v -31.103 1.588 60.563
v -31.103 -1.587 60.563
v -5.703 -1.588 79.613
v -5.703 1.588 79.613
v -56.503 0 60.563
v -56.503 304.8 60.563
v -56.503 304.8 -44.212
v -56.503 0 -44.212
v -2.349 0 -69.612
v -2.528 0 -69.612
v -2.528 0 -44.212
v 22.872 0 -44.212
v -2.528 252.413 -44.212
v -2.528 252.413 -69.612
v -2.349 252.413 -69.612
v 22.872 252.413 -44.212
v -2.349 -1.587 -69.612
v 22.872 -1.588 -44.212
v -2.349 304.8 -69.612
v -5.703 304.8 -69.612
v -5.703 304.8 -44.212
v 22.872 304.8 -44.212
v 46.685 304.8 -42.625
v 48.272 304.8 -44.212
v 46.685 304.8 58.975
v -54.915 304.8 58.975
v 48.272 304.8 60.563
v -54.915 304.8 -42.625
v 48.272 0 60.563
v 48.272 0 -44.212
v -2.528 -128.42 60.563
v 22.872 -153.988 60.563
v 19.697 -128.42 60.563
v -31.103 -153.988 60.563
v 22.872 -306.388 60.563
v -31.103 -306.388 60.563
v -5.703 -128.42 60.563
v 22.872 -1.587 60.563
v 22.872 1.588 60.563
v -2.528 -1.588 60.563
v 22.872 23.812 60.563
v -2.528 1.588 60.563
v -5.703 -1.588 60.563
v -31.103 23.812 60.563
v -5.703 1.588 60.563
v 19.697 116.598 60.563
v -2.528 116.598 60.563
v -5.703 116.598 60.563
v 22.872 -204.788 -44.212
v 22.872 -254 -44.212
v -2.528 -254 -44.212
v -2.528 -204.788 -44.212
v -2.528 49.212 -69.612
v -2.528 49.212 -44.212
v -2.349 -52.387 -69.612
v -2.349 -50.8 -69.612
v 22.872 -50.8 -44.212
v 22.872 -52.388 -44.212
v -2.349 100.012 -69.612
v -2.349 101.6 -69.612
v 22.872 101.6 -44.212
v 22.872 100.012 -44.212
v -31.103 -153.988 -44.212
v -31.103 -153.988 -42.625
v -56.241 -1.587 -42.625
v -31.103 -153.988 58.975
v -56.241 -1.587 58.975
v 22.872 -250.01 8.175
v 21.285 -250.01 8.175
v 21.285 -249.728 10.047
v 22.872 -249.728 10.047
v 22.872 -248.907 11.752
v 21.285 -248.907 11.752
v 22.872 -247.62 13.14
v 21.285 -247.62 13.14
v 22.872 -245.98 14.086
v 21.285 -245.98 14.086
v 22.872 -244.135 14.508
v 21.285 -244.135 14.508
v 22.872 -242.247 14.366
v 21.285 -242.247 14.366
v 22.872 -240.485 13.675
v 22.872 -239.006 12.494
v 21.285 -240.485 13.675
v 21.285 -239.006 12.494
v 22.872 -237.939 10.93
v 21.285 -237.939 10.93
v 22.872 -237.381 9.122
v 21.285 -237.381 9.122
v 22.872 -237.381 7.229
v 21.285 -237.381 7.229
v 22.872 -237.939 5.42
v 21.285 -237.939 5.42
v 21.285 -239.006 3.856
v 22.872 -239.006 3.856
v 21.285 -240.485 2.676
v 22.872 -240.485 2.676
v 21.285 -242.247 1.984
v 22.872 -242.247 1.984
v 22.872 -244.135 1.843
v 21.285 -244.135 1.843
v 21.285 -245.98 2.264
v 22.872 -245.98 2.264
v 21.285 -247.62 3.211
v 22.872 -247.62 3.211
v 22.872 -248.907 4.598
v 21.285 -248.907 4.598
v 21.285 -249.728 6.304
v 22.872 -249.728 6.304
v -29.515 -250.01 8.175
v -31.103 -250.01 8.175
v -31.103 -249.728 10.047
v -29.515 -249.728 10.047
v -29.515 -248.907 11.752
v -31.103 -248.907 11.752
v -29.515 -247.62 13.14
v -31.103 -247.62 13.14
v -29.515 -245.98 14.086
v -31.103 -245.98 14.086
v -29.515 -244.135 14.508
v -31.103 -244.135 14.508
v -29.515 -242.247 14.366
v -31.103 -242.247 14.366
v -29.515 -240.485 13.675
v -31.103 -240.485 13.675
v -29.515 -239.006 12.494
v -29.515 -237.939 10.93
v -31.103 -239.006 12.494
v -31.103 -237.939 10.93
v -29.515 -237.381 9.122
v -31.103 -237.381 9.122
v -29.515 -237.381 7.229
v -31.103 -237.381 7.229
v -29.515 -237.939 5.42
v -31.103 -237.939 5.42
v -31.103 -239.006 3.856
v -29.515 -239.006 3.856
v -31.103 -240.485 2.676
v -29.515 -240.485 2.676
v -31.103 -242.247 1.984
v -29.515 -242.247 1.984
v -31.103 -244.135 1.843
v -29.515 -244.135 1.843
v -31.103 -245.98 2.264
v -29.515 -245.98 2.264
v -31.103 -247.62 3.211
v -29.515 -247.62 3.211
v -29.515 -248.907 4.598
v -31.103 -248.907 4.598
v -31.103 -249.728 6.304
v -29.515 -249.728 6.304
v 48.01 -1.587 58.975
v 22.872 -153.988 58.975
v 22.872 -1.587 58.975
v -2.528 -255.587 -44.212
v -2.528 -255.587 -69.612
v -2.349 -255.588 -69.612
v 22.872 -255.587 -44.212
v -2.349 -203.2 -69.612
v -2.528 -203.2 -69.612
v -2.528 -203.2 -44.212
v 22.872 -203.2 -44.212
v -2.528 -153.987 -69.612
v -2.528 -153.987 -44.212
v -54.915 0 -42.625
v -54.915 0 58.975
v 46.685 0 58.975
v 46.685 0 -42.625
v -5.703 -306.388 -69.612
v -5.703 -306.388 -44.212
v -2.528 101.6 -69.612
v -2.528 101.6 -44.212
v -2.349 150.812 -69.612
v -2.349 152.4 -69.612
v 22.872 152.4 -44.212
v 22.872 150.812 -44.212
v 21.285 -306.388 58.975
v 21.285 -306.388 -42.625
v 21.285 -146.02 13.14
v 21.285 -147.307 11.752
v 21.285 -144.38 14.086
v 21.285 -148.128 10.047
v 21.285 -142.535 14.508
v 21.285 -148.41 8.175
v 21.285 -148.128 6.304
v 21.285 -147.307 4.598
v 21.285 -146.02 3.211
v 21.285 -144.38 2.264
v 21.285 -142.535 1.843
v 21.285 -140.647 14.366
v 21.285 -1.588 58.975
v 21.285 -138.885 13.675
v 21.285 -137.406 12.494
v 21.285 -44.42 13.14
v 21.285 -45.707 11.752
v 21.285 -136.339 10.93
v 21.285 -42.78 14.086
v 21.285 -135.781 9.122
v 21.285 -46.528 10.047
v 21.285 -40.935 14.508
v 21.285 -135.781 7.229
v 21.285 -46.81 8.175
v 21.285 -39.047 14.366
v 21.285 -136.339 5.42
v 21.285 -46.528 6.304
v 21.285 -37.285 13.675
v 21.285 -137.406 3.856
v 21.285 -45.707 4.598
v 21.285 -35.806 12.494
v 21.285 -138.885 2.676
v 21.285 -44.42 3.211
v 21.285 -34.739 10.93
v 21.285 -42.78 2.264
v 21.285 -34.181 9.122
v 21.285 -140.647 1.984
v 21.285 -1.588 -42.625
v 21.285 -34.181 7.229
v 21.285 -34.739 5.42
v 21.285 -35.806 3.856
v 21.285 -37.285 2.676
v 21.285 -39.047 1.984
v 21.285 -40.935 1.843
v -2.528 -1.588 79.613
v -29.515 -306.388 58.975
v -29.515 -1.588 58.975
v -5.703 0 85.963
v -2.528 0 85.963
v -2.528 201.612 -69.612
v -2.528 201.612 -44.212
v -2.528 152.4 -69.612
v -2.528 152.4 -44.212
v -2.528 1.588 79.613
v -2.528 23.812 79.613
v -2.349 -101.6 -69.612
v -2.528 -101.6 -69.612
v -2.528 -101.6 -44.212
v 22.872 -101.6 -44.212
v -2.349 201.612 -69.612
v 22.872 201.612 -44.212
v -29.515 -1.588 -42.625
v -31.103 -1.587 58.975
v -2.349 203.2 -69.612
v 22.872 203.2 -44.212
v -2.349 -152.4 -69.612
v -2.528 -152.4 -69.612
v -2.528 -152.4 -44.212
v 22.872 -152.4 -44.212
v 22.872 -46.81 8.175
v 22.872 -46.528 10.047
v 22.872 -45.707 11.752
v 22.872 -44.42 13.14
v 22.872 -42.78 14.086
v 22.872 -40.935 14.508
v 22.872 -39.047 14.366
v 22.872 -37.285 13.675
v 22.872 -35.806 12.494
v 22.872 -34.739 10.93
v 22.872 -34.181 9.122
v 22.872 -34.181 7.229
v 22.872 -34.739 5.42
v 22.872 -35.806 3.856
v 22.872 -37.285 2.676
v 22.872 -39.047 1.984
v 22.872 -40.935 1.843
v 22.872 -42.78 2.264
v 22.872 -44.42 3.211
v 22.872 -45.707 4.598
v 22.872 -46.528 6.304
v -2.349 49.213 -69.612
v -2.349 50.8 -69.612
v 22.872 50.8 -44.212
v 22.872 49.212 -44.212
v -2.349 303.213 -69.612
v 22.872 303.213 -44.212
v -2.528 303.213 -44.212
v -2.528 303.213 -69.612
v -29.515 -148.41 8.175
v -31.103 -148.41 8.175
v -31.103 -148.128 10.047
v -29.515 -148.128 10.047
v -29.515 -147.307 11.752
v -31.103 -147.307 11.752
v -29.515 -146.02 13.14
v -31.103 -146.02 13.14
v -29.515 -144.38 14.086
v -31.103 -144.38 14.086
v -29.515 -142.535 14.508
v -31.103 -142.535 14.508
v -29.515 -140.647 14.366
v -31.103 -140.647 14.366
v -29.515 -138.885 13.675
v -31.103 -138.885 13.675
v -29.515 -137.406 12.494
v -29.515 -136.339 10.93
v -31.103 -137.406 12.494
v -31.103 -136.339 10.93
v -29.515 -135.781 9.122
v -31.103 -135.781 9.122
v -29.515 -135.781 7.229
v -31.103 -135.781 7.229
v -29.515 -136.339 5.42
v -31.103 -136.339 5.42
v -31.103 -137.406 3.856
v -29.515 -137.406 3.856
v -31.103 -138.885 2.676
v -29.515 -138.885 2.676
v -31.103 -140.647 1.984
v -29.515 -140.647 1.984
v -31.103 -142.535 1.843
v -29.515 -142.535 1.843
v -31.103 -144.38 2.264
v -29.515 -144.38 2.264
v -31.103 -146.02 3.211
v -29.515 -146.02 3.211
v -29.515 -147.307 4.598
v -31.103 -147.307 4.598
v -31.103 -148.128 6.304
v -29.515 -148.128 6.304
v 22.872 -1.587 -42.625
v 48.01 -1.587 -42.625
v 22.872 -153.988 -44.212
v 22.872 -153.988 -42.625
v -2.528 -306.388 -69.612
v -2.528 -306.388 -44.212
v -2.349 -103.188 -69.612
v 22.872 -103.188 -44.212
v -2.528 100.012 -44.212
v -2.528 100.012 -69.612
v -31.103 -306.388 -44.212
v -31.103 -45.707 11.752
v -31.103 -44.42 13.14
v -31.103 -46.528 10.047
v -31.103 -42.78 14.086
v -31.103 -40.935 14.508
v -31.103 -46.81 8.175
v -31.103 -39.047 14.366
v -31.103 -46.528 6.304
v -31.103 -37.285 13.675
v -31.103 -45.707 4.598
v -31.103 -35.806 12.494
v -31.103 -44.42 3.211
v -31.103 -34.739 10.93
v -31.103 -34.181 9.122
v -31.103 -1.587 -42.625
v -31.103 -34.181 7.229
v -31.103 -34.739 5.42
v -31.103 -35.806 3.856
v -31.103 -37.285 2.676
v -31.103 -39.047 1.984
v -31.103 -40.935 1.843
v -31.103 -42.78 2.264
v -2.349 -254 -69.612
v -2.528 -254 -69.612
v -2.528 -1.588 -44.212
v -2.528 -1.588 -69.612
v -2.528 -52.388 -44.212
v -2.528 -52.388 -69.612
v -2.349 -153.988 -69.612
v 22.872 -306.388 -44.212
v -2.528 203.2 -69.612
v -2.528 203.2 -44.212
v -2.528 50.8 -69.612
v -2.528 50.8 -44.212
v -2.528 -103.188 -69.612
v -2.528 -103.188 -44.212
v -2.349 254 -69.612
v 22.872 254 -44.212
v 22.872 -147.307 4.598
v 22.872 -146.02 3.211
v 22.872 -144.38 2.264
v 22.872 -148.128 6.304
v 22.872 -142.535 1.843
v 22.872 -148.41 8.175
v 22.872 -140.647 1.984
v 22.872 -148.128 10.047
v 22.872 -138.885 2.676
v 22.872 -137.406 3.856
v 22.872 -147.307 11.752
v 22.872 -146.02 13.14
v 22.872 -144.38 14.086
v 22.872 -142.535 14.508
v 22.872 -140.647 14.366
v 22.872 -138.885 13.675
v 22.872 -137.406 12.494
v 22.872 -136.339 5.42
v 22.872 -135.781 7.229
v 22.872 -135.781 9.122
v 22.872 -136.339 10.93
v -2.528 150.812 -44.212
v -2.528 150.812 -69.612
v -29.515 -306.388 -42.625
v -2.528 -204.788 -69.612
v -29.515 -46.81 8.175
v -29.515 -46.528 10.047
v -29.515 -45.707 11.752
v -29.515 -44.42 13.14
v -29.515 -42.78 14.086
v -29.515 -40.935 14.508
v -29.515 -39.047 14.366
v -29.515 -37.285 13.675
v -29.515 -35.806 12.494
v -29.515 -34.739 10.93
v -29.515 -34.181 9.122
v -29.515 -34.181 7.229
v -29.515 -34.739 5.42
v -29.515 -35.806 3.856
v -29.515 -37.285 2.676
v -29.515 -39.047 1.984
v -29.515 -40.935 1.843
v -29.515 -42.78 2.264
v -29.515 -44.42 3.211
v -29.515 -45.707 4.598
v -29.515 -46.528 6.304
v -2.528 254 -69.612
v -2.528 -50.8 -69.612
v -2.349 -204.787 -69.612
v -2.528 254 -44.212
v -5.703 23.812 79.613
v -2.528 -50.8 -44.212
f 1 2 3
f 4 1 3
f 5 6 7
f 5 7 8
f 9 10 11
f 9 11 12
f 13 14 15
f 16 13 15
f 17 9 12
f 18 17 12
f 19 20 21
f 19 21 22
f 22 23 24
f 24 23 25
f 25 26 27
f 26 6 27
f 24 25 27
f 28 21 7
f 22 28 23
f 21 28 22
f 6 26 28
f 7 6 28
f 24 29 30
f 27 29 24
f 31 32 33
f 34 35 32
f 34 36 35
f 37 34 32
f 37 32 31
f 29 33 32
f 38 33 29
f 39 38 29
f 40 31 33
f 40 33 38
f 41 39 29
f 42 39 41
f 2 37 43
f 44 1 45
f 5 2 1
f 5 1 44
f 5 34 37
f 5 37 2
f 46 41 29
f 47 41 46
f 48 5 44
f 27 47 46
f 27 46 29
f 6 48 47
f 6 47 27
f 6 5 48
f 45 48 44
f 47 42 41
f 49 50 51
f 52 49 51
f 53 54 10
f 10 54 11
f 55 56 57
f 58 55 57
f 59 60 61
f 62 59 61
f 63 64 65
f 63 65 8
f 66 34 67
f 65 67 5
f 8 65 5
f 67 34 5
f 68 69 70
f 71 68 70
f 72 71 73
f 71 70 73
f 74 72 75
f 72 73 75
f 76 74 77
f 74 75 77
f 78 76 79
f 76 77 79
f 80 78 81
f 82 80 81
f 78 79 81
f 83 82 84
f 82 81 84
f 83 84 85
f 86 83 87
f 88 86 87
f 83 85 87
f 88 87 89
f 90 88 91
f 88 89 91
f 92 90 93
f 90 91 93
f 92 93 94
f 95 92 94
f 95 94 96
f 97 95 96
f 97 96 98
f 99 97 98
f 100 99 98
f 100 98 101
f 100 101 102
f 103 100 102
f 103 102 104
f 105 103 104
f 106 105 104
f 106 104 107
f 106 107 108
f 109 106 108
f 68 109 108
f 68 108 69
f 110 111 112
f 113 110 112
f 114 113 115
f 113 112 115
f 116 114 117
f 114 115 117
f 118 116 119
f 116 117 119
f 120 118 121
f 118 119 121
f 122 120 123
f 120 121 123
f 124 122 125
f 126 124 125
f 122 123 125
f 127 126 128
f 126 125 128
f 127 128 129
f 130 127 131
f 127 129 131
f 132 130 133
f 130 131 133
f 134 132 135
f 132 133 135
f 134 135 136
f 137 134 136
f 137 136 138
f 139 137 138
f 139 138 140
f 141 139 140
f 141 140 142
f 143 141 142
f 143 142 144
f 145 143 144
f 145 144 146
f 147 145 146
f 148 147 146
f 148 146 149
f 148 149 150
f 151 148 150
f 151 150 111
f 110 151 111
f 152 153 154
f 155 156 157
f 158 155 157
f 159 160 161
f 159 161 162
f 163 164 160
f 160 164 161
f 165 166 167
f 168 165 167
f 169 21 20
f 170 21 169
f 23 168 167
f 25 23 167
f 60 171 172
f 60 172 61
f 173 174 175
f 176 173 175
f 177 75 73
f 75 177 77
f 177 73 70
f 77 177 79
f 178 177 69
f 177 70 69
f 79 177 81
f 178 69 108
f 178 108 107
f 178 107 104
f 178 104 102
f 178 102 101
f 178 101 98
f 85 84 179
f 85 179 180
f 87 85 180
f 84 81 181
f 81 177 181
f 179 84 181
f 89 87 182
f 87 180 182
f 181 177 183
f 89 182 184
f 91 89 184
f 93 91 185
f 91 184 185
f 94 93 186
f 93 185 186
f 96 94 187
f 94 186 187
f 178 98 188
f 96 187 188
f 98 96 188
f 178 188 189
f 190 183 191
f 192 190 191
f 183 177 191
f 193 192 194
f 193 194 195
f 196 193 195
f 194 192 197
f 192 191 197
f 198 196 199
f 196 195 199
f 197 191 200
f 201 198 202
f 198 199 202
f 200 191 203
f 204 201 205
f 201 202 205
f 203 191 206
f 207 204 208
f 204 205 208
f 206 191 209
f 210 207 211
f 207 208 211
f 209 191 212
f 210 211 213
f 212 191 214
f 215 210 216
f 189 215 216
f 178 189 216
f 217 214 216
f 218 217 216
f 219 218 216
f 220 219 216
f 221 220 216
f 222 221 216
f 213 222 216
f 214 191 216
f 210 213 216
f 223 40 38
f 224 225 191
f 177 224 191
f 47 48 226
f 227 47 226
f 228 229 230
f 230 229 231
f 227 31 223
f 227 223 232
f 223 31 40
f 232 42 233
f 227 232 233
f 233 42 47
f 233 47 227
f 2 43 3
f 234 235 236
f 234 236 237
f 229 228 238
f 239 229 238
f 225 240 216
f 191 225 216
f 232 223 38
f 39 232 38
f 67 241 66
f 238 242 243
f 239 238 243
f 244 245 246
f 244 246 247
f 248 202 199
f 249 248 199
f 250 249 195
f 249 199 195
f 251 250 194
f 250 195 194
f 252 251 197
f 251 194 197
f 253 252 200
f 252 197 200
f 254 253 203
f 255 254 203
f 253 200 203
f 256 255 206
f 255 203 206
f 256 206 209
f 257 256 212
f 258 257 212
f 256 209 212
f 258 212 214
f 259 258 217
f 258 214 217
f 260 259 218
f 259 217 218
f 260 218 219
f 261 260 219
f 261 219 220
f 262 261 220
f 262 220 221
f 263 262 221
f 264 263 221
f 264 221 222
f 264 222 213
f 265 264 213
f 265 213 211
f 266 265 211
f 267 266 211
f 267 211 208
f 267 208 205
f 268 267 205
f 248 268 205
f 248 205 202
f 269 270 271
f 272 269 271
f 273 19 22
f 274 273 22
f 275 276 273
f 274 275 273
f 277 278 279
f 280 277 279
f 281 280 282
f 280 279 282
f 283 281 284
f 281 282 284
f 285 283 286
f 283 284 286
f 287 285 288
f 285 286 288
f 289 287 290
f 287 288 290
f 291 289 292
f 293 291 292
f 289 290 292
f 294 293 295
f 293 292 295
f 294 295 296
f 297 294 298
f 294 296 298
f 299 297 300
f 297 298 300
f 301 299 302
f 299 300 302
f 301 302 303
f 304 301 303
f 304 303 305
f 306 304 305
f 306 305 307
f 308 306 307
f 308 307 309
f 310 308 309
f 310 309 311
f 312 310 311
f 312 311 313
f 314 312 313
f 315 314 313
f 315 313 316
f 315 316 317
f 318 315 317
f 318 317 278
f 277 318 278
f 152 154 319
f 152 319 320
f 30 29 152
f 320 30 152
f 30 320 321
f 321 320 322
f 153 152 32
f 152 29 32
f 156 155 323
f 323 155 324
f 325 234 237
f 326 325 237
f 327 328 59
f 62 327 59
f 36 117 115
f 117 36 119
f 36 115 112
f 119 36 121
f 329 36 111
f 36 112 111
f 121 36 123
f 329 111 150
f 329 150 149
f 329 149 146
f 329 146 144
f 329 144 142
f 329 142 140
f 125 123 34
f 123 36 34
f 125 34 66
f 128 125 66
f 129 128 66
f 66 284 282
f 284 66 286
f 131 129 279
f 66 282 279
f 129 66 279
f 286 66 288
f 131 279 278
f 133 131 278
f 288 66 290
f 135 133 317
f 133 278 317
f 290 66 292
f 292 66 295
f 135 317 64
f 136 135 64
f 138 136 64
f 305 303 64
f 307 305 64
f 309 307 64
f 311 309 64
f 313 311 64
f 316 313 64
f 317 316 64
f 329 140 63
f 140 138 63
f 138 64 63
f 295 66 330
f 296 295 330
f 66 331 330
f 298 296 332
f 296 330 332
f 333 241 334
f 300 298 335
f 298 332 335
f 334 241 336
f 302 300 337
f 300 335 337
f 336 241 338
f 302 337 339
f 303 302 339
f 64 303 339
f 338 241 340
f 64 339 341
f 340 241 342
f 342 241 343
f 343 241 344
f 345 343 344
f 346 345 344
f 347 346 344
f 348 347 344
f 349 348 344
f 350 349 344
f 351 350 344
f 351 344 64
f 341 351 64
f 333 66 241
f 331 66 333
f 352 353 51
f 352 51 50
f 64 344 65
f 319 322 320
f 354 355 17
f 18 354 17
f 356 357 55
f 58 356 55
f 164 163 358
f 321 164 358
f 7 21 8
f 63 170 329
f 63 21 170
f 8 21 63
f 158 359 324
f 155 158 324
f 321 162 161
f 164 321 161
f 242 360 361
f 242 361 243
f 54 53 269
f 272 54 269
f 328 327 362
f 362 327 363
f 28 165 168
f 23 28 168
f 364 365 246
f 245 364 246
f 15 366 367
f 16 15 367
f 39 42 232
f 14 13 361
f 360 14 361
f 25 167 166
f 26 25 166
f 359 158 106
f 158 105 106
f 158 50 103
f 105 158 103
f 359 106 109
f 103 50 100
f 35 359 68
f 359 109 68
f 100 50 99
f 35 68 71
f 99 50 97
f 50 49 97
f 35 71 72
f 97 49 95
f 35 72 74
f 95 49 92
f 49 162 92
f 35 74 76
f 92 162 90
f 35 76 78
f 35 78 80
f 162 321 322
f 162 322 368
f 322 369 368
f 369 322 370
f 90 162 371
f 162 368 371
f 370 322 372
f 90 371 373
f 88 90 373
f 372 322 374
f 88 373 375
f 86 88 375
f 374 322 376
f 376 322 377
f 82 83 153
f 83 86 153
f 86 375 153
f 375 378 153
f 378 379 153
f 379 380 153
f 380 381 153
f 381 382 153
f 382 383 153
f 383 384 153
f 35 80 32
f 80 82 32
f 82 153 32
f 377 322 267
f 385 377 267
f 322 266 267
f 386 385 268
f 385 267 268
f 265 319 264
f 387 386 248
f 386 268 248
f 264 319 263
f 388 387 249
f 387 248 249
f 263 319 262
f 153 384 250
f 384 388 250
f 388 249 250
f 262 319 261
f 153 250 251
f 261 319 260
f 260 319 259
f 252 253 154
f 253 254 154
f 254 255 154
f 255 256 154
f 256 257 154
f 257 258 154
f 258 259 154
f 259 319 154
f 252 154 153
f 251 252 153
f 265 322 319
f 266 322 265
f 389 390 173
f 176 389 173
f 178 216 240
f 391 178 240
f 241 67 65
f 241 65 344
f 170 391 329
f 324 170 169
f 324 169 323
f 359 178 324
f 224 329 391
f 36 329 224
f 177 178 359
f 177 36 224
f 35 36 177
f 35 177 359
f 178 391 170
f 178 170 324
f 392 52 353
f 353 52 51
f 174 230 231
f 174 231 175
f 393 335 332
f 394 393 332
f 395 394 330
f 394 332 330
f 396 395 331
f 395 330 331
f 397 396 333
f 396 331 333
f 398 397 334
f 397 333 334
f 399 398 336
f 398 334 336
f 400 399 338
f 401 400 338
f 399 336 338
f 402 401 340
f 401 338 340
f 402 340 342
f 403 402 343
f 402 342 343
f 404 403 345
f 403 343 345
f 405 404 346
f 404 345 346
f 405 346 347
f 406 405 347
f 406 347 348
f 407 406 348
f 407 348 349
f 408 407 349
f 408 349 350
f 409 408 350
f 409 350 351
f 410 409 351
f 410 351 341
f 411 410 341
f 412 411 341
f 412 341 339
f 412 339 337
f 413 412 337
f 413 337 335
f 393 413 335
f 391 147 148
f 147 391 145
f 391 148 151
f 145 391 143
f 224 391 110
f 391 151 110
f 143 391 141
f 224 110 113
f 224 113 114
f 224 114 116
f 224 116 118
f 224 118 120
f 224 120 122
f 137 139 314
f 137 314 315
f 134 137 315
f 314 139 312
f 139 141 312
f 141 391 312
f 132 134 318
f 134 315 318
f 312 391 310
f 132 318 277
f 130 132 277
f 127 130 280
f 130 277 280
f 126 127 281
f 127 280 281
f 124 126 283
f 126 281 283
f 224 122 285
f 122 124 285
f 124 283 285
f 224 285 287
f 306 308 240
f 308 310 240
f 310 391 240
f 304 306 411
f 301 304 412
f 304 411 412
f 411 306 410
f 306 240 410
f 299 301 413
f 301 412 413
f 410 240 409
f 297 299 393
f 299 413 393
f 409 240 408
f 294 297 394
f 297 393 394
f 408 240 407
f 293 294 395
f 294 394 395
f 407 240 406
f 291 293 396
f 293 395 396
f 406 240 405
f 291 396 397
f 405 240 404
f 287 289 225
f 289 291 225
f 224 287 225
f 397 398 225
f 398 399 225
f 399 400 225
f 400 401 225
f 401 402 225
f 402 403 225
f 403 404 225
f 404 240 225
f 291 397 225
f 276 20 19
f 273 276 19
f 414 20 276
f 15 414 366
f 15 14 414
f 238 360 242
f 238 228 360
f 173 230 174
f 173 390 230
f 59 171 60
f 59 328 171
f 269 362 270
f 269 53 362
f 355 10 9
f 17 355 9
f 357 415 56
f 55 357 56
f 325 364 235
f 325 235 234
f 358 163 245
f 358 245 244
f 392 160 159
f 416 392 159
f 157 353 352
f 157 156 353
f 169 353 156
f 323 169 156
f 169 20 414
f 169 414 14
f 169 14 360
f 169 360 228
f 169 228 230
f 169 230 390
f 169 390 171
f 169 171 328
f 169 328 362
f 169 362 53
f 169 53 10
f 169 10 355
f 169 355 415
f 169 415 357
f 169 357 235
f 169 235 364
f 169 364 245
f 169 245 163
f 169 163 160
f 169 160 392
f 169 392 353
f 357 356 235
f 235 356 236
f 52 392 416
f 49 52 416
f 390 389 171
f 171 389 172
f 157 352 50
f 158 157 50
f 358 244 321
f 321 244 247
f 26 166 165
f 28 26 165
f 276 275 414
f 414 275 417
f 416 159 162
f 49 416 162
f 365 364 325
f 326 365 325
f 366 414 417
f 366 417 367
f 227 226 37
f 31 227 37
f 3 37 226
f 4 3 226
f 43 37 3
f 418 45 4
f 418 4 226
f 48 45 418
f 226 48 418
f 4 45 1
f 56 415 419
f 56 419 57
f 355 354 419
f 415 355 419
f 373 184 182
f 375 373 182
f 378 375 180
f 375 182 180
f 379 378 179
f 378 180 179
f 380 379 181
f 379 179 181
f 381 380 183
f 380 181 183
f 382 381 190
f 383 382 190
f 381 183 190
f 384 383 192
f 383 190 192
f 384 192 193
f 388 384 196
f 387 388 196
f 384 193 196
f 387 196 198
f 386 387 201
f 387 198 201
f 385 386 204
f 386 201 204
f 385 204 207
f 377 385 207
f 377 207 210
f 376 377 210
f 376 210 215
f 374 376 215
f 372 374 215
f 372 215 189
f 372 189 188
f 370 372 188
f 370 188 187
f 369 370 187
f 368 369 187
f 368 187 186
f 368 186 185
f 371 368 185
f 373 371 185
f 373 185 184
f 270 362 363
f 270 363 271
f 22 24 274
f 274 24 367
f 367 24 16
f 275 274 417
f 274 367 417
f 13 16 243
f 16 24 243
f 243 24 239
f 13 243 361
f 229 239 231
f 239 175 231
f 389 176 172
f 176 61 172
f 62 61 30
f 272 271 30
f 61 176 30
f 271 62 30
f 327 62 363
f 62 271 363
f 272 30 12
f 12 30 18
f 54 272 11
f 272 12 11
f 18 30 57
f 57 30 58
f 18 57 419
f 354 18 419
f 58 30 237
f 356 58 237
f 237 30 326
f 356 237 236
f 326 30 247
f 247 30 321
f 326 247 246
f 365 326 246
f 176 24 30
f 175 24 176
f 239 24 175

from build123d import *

# Parameters (mm, degrees)
F0_W           = 104.775
F0_H           = 104.775
F0_W_2         = 101.6
F0_H_2         = 101.6
F1_DEPTH       = 1.5875
F3_DEPTH       = 304.8
F5_DEPTH       = 304.8
F6_W           = 152.4
F6_H           = 1.5875
F7_DEPTH       = 25.4
F8_W           = 152.4
F8_H           = 1.5875
F9_DEPTH       = 25.4
F11_DEPTH      = 177.8
F12_W          = 3.175
F12_H          = 611.1875
F13_DEPTH      = 25.4
F14_R          = 6.35
F15_DEPTH      = 213.36
F16_W          = 25.4
F16_H          = 1.5875
F17_DEPTH      = 25.4
F19_DEPTH      = 1828.8
F20_W          = 1.5875
F20_H          = 245.0186535716
F21_DEPTH      = 25.4
F23_DEPTH      = 25.4
F24_W          = 1.5875
F24_H          = 19.05
F25_DEPTH      = 25.4
F25_DEPTH_BACK = 28.575
F27_DEPTH      = 25.4
F29_DEPTH      = 25.4


with BuildPart() as f1:
    # F0 (on Front) → F1 (new body)
    with BuildSketch(Plane.XZ):
        with Locations((-4.1154902428, 8.1752620383)):
            Rectangle(F0_W, F0_H)
        with Locations((-4.1154902428, 8.1752620383)):
            Rectangle(F0_W_2, F0_H_2, mode=Mode.SUBTRACT)
        with Locations((-4.1154902428, 8.1752620383)):
            Rectangle(F0_W_2, F0_H_2)
    extrude(amount=F1_DEPTH)

    # F2 (on face) → F3 (join)
    with BuildSketch(Plane(origin=(0, 0, 0), x_dir=(-1, 0, 0), z_dir=(0, 1, 0))):
        Polygon((-46.6845097572, 58.9752620383), (-48.2720097572, 60.5627620383), (-48.2720097572, -44.2122379617), (56.5029902428, -44.2122379617), (54.9154902428, -42.6247379617), (-46.6845097572, -42.6247379617), align=None)
        Polygon((56.5029902428, 60.5627620383), (-48.2720097572, 60.5627620383), (-46.6845097572, 58.9752620383), (54.9154902428, 58.9752620383), (54.9154902428, -42.6247379617), (56.5029902428, -44.2122379617), align=None)
    extrude(amount=F3_DEPTH)

    # F4 (on face) → F5 (join)
    with BuildSketch(Plane.XZ.offset(1.5875)):
        Polygon((-31.1029902428, 60.5627620383), (-31.1029902428, 35.1627620383), (-29.5154902428, 33.5752620383), (-29.5154902428, 58.9752620383), (21.2845097572, 58.9752620383), (21.2845097572, -17.2247379617), (22.8720097572, -18.8122379617), (22.8720097572, 60.5627620383), align=None)
        Polygon((-29.5154902428, 33.5752620383), (-31.1029902428, 35.1627620383), (-31.1029902428, -44.2122379617), (22.8720097572, -44.2122379617), (22.8720097572, -18.8122379617), (21.2845097572, -17.2247379617), (21.2845097572, -42.6247379617), (-29.5154902428, -42.6247379617), align=None)
    extrude(amount=F5_DEPTH)

    # F6 (on face) → F7 (join)
    with BuildSketch(Plane(origin=(-31.1029902428, 0, 0), x_dir=(0, -1, 0), z_dir=(-1, 0, 0))):
        with Locations((77.7875, 59.7690120383)):
            Rectangle(F6_W, F6_H)
        with Locations((77.7875, -43.4184879617)):
            Rectangle(F6_W, F6_H)
    extrude(amount=F7_DEPTH)

    # F8 (on face) → F9 (join)
    with BuildSketch(Plane.YZ.offset(22.8720097572)):
        with Locations((-77.7875, 59.7690120383)):
            Rectangle(F8_W, F8_H)
        with Locations((-77.7875, -43.4184879617)):
            Rectangle(F8_W, F8_H)
    extrude(amount=F9_DEPTH)

    # F10 (on face) → F11 (cut)
    with BuildSketch(Plane.XY.offset(60.5627620383)):
        Polygon((-31.1029902428, -153.9875), (-56.5029902428, 0), (-56.5029902428, -153.9875), align=None)
        Polygon((48.2720097572, -153.9875), (48.2720097572, 0), (22.8720097572, -153.9875), align=None)
    extrude(amount=-F11_DEPTH, mode=Mode.SUBTRACT)

    # F12 (on face) → F13 (join)
    with BuildSketch(Plane(origin=(0, 0, -44.2122379617), x_dir=(1, 0, 0), z_dir=(0, 0, -1))):
        with Locations((-4.1154902428, 0.79375)):
            Rectangle(F12_W, F12_H)
    extrude(amount=F13_DEPTH)

    # F14 (on face) → F15 (cut)
    with BuildSketch(Plane(origin=(-31.1029902428, 0, 0), x_dir=(0, -1, 0), z_dir=(-1, 0, 0))):
        with Locations((40.4604896903, 8.1752620383)):
            Circle(F14_R)
        with Locations((142.0604896903, 8.1752620383)):
            Circle(F14_R)
        with Locations((243.6604896903, 8.1752620383)):
            Circle(F14_R)
    extrude(amount=-F15_DEPTH, mode=Mode.SUBTRACT)

    # F16 (on face) → F17 (join)
    with BuildSketch(Plane(origin=(0, 0, -44.2122379617), x_dir=(1, 0, 0), z_dir=(0, 0, -1))):
        with Locations((10.1720097572, -304.00625)):
            Rectangle(F16_W, F16_H)
        with Locations((10.1720097572, -253.20625)):
            Rectangle(F16_W, F16_H)
        with Locations((10.1720097572, -202.40625)):
            Rectangle(F16_W, F16_H)
        with Locations((10.1720097572, -151.60625)):
            Rectangle(F16_W, F16_H)
        with Locations((10.1720097572, -100.80625)):
            Rectangle(F16_W, F16_H)
        with Locations((10.1720097572, -50.00625)):
            Rectangle(F16_W, F16_H)
        with Locations((10.1720097572, 0.79375)):
            Rectangle(F16_W, F16_H)
        with Locations((10.1720097572, 102.39375)):
            Rectangle(F16_W, F16_H)
        with Locations((10.1720097572, 51.59375)):
            Rectangle(F16_W, F16_H)
        with Locations((10.1720097572, 153.19375)):
            Rectangle(F16_W, F16_H)
        with Locations((10.1720097572, 203.99375)):
            Rectangle(F16_W, F16_H)
        with Locations((10.1720097572, 254.79375)):
            Rectangle(F16_W, F16_H)
    extrude(amount=F17_DEPTH)

    # F18 (on face) → F19 (cut)
    with BuildSketch(Plane(origin=(0, 304.8, 0), x_dir=(-1, 0, 0), z_dir=(0, 1, 0))):
        Polygon((-22.8720097572, -69.6122379617), (2.3494476918, -69.6122379617), (-22.8720097572, -44.2122379617), align=None)
    extrude(amount=-F19_DEPTH, mode=Mode.SUBTRACT)

    # F20 (on face) → F21 (join)
    with BuildSketch(Plane.XY.offset(60.5627620383)):
        with Locations((-4.9092402428, -5.9108771384)):
            Rectangle(F20_W, F20_H)
        with Locations((-3.3217402428, -5.9108771384)):
            Rectangle(F20_W, F20_H)
    extrude(amount=F21_DEPTH)

    # F22 (on face) → F23 (cut)
    with BuildSketch(Plane(origin=(-5.7029902428, 0, 0), x_dir=(0, -1, 0), z_dir=(-1, 0, 0))):
        Polygon((-116.5984496474, 85.9627620383), (-116.5984496474, 60.5627620383), (0, 85.9627620383), align=None)
        Polygon((128.4202039242, 85.9627620383), (0, 85.9627620383), (128.4202039242, 60.5627620383), align=None)
    extrude(amount=-F23_DEPTH, mode=Mode.SUBTRACT)

    # F24 (on face) → F25 (join, two sides)
    with BuildSketch(Plane(origin=(-5.7029902428, 0, 0), x_dir=(0, -1, 0), z_dir=(-1, 0, 0))) as f25_sk:
        with Locations((-0.79375, 70.0877620383)):
            Rectangle(F24_W, F24_H)
        with Locations((0.79375, 70.0877620383)):
            Rectangle(F24_W, F24_H)
    extrude(amount=F25_DEPTH)
    extrude(f25_sk.sketch, amount=-F25_DEPTH_BACK)

    # F26 (on face) → F27 (cut)
    with BuildSketch(Plane.XZ.offset(1.5875)):
        Polygon((-31.1029902428, 60.5627620383), (-5.7029902428, 79.6127620383), (-31.1029902428, 79.6127620383), align=None)
    extrude(amount=-F27_DEPTH, mode=Mode.SUBTRACT)

    # F28 (on face) → F29 (cut)
    with BuildSketch(Plane.XZ.offset(1.5875)):
        Polygon((22.8720097572, 79.6127620383), (-2.5279902428, 79.6127620383), (22.8720097572, 60.5627620383), align=None)
    extrude(amount=-F29_DEPTH, mode=Mode.SUBTRACT)


solid = f1.part
